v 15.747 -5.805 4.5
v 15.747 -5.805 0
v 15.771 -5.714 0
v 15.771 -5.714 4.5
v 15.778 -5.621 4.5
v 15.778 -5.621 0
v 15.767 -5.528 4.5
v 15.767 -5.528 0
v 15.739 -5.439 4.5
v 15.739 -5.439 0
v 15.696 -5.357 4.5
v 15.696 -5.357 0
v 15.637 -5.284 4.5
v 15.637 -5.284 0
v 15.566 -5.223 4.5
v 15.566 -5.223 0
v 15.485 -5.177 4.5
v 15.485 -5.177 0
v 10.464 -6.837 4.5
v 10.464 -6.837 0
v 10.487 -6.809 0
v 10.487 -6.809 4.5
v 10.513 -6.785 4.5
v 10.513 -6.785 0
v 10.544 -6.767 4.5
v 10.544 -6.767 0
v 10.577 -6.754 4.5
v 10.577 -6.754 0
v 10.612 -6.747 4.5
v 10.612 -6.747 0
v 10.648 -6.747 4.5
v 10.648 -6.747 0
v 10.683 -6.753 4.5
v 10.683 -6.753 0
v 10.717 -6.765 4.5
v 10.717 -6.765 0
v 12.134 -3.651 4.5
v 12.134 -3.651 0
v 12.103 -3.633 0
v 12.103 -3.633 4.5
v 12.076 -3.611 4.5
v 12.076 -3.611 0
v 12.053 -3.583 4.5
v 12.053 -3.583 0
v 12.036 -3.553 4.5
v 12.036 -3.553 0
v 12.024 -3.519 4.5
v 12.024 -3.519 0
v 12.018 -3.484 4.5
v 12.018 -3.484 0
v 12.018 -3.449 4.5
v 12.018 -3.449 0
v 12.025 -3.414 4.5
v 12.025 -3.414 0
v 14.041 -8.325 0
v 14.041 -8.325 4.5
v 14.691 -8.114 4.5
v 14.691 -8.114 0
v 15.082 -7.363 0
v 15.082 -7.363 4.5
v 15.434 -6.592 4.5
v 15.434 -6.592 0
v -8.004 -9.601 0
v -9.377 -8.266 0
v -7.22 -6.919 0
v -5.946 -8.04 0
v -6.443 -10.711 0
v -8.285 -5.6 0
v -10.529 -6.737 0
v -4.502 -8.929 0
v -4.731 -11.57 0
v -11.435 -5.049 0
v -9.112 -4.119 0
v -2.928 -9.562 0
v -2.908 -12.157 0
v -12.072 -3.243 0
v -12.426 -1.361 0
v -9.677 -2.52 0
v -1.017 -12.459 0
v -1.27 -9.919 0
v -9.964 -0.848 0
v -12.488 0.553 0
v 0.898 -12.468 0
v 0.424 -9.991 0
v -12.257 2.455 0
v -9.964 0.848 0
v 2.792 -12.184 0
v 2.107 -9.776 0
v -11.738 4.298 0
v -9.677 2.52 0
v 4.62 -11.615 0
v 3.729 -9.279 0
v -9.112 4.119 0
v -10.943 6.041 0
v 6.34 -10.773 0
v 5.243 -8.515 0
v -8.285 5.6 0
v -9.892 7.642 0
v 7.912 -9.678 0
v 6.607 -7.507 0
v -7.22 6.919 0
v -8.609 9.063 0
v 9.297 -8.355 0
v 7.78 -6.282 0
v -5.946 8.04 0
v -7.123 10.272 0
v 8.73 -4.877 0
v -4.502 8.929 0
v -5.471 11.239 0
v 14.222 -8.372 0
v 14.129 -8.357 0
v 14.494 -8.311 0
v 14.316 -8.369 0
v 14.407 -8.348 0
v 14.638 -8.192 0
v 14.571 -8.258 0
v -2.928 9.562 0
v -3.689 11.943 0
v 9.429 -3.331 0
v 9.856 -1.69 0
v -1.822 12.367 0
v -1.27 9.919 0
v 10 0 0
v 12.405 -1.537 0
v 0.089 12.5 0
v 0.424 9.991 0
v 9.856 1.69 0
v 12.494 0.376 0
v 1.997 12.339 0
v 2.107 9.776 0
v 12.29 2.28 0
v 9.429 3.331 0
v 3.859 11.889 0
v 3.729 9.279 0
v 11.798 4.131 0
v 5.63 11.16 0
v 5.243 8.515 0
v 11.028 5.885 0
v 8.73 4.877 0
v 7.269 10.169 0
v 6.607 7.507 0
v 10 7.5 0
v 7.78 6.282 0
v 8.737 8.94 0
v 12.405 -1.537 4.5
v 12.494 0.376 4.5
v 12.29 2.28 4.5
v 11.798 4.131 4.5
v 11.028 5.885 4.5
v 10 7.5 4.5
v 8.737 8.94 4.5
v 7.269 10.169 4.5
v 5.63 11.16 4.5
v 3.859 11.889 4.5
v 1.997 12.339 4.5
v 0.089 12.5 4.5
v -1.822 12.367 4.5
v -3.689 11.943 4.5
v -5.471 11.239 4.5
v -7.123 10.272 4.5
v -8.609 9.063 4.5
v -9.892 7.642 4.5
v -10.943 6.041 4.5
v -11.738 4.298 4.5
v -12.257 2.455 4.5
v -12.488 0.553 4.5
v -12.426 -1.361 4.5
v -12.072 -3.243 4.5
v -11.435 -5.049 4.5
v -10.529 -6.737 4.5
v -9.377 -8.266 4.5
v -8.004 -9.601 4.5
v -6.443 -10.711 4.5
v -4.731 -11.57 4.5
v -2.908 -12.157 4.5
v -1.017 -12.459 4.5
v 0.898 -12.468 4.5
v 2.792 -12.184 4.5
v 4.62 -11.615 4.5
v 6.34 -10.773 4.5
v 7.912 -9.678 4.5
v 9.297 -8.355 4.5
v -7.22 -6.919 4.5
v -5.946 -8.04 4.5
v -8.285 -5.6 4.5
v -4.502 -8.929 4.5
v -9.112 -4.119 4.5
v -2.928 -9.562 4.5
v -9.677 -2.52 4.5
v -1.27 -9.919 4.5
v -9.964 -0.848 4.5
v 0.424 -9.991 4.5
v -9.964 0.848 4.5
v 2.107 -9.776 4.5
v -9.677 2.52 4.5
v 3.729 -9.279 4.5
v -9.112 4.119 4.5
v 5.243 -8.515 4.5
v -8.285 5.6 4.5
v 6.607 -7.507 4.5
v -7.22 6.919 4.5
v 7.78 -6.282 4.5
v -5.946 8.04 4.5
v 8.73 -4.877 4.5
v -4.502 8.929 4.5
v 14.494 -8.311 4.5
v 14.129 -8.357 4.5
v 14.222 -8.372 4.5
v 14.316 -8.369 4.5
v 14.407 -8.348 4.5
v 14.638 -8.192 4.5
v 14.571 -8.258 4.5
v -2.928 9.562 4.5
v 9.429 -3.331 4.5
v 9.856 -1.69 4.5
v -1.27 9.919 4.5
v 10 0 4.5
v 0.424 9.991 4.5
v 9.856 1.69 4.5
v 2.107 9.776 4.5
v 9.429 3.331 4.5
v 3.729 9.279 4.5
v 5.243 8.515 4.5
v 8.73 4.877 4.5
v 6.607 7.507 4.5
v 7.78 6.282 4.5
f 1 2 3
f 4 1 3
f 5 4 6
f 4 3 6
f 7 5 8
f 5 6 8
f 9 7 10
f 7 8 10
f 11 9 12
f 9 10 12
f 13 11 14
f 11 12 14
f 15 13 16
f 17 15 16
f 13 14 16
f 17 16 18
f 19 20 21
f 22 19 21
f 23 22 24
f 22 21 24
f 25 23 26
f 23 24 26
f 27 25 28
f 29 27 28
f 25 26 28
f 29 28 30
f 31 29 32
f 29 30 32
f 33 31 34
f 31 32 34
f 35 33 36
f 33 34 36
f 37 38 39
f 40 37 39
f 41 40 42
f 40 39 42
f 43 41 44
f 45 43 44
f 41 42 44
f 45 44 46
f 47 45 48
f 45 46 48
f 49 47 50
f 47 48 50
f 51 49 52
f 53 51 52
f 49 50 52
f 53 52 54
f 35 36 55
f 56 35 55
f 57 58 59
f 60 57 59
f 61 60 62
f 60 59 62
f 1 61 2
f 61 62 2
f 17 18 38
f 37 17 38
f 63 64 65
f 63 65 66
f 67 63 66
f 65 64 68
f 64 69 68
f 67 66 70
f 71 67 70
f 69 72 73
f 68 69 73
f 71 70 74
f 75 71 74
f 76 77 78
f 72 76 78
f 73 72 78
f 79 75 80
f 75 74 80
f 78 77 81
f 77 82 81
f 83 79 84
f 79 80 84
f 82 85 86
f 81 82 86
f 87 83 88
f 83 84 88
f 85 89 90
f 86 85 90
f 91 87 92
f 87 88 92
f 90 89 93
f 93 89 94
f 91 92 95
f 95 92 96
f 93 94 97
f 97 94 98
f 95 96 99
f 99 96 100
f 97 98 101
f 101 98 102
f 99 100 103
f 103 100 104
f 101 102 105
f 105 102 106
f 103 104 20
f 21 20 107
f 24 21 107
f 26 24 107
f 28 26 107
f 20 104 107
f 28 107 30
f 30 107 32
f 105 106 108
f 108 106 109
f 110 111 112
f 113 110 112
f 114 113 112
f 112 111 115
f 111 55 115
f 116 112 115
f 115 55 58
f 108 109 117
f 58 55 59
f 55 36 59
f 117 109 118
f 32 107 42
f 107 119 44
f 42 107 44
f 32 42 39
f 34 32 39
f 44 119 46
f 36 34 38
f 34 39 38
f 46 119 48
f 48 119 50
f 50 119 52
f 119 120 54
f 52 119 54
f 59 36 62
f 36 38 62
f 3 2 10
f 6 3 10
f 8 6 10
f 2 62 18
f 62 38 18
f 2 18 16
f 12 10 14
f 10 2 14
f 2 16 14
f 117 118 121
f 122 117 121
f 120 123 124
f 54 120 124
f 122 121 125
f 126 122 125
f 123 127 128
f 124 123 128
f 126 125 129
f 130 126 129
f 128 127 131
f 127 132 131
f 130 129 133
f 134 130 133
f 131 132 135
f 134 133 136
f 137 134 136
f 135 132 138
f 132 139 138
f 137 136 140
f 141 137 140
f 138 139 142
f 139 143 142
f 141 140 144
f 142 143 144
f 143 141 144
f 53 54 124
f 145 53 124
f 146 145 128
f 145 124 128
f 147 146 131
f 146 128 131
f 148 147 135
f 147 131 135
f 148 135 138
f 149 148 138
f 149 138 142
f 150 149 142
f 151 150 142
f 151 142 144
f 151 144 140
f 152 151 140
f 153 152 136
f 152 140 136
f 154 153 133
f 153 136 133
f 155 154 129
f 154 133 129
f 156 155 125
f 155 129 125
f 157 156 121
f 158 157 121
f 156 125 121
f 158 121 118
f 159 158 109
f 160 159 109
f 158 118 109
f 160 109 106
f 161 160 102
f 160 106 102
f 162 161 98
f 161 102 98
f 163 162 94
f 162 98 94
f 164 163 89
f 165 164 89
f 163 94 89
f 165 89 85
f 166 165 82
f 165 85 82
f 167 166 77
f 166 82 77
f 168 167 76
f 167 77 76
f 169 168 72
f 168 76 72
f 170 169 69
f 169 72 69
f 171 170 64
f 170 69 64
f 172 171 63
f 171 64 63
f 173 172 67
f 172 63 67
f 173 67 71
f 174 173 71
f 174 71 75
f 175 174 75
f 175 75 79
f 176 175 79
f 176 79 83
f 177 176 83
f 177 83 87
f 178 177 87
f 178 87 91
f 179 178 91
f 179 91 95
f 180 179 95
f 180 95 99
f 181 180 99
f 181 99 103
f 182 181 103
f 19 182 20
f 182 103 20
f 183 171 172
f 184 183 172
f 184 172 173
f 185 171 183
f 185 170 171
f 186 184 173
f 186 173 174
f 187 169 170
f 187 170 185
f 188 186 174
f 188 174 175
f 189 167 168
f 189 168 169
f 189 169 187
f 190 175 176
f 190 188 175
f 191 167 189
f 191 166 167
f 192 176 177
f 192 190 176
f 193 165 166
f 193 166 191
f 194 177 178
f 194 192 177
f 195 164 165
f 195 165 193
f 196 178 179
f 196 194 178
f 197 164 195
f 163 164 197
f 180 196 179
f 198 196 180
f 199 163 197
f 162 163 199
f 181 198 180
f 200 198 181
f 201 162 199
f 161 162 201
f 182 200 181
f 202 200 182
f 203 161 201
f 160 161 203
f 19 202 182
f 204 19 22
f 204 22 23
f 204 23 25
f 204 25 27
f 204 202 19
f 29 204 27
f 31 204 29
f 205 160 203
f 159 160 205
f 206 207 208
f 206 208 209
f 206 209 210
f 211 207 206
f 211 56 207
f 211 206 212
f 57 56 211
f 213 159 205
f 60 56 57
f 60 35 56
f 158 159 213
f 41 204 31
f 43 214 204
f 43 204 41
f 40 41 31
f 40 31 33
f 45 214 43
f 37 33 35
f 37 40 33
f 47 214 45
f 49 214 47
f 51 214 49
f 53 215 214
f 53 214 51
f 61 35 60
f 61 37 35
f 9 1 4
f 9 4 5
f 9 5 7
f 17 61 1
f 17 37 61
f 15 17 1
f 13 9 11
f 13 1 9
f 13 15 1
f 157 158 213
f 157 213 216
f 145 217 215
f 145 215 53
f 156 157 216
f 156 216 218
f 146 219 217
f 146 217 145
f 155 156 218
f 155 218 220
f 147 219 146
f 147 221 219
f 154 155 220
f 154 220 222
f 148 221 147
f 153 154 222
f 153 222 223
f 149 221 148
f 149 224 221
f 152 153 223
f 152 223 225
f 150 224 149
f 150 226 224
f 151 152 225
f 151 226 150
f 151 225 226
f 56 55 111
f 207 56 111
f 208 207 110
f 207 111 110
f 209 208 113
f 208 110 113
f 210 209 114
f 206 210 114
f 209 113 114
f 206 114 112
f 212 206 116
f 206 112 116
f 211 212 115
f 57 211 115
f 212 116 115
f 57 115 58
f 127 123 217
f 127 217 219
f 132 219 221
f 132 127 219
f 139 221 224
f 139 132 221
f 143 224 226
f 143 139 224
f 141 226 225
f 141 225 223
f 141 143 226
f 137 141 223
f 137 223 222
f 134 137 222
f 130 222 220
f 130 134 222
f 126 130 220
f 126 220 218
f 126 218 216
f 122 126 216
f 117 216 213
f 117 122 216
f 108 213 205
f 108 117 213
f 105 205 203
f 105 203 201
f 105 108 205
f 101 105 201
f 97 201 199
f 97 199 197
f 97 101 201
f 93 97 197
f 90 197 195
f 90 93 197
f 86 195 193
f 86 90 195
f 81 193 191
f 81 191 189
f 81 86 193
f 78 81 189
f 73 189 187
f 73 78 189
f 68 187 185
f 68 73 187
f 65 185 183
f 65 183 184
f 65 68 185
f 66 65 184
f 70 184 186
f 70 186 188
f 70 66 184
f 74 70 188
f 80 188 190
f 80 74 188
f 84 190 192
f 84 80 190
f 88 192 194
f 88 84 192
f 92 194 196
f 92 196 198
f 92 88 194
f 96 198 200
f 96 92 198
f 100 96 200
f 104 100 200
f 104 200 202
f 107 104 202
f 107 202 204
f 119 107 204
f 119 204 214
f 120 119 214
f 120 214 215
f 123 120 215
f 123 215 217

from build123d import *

# Parameters (mm, degrees)
ESQUISSE1_R        = 10
BOSS_EXTRU_3_DEPTH = 4.5


with BuildPart() as part:
    # Esquisse1 → Boss.-Extru.3 (new body)
    with BuildSketch(Plane.XY):
        with BuildLine():
            Line((15.485185595, -5.176669047), (12.134231543, -3.650742984))
            ThreePointArc((12.134231543, -3.650742984), (12.035609724, -3.552721892), (12.024721053, -3.414100701))
            ThreePointArc((12.024721053, -3.414100701), (-11.374079439, 5.184623122), (10.464430261, -6.837082661))
            ThreePointArc((10.464430261, -6.837082661), (10.577237298, -6.754079946), (10.716830338, -6.765422852))
            Line((10.716830338, -6.765422852), (14.040747626, -8.325354826))
            ThreePointArc((14.040747626, -8.325354826), (14.40745115, -8.348324263), (14.690843755, -8.114470246))
            ThreePointArc((14.690843755, -8.114470246), (15.262737454, -6.979567539), (15.747114807, -5.80464408))
            ThreePointArc((15.747114807, -5.80464408), (15.739440197, -5.439232144), (15.485185595, -5.176669047))
        make_face()
        Circle(ESQUISSE1_R, mode=Mode.SUBTRACT)
    extrude(amount=BOSS_EXTRU_3_DEPTH)


solid = part.part
